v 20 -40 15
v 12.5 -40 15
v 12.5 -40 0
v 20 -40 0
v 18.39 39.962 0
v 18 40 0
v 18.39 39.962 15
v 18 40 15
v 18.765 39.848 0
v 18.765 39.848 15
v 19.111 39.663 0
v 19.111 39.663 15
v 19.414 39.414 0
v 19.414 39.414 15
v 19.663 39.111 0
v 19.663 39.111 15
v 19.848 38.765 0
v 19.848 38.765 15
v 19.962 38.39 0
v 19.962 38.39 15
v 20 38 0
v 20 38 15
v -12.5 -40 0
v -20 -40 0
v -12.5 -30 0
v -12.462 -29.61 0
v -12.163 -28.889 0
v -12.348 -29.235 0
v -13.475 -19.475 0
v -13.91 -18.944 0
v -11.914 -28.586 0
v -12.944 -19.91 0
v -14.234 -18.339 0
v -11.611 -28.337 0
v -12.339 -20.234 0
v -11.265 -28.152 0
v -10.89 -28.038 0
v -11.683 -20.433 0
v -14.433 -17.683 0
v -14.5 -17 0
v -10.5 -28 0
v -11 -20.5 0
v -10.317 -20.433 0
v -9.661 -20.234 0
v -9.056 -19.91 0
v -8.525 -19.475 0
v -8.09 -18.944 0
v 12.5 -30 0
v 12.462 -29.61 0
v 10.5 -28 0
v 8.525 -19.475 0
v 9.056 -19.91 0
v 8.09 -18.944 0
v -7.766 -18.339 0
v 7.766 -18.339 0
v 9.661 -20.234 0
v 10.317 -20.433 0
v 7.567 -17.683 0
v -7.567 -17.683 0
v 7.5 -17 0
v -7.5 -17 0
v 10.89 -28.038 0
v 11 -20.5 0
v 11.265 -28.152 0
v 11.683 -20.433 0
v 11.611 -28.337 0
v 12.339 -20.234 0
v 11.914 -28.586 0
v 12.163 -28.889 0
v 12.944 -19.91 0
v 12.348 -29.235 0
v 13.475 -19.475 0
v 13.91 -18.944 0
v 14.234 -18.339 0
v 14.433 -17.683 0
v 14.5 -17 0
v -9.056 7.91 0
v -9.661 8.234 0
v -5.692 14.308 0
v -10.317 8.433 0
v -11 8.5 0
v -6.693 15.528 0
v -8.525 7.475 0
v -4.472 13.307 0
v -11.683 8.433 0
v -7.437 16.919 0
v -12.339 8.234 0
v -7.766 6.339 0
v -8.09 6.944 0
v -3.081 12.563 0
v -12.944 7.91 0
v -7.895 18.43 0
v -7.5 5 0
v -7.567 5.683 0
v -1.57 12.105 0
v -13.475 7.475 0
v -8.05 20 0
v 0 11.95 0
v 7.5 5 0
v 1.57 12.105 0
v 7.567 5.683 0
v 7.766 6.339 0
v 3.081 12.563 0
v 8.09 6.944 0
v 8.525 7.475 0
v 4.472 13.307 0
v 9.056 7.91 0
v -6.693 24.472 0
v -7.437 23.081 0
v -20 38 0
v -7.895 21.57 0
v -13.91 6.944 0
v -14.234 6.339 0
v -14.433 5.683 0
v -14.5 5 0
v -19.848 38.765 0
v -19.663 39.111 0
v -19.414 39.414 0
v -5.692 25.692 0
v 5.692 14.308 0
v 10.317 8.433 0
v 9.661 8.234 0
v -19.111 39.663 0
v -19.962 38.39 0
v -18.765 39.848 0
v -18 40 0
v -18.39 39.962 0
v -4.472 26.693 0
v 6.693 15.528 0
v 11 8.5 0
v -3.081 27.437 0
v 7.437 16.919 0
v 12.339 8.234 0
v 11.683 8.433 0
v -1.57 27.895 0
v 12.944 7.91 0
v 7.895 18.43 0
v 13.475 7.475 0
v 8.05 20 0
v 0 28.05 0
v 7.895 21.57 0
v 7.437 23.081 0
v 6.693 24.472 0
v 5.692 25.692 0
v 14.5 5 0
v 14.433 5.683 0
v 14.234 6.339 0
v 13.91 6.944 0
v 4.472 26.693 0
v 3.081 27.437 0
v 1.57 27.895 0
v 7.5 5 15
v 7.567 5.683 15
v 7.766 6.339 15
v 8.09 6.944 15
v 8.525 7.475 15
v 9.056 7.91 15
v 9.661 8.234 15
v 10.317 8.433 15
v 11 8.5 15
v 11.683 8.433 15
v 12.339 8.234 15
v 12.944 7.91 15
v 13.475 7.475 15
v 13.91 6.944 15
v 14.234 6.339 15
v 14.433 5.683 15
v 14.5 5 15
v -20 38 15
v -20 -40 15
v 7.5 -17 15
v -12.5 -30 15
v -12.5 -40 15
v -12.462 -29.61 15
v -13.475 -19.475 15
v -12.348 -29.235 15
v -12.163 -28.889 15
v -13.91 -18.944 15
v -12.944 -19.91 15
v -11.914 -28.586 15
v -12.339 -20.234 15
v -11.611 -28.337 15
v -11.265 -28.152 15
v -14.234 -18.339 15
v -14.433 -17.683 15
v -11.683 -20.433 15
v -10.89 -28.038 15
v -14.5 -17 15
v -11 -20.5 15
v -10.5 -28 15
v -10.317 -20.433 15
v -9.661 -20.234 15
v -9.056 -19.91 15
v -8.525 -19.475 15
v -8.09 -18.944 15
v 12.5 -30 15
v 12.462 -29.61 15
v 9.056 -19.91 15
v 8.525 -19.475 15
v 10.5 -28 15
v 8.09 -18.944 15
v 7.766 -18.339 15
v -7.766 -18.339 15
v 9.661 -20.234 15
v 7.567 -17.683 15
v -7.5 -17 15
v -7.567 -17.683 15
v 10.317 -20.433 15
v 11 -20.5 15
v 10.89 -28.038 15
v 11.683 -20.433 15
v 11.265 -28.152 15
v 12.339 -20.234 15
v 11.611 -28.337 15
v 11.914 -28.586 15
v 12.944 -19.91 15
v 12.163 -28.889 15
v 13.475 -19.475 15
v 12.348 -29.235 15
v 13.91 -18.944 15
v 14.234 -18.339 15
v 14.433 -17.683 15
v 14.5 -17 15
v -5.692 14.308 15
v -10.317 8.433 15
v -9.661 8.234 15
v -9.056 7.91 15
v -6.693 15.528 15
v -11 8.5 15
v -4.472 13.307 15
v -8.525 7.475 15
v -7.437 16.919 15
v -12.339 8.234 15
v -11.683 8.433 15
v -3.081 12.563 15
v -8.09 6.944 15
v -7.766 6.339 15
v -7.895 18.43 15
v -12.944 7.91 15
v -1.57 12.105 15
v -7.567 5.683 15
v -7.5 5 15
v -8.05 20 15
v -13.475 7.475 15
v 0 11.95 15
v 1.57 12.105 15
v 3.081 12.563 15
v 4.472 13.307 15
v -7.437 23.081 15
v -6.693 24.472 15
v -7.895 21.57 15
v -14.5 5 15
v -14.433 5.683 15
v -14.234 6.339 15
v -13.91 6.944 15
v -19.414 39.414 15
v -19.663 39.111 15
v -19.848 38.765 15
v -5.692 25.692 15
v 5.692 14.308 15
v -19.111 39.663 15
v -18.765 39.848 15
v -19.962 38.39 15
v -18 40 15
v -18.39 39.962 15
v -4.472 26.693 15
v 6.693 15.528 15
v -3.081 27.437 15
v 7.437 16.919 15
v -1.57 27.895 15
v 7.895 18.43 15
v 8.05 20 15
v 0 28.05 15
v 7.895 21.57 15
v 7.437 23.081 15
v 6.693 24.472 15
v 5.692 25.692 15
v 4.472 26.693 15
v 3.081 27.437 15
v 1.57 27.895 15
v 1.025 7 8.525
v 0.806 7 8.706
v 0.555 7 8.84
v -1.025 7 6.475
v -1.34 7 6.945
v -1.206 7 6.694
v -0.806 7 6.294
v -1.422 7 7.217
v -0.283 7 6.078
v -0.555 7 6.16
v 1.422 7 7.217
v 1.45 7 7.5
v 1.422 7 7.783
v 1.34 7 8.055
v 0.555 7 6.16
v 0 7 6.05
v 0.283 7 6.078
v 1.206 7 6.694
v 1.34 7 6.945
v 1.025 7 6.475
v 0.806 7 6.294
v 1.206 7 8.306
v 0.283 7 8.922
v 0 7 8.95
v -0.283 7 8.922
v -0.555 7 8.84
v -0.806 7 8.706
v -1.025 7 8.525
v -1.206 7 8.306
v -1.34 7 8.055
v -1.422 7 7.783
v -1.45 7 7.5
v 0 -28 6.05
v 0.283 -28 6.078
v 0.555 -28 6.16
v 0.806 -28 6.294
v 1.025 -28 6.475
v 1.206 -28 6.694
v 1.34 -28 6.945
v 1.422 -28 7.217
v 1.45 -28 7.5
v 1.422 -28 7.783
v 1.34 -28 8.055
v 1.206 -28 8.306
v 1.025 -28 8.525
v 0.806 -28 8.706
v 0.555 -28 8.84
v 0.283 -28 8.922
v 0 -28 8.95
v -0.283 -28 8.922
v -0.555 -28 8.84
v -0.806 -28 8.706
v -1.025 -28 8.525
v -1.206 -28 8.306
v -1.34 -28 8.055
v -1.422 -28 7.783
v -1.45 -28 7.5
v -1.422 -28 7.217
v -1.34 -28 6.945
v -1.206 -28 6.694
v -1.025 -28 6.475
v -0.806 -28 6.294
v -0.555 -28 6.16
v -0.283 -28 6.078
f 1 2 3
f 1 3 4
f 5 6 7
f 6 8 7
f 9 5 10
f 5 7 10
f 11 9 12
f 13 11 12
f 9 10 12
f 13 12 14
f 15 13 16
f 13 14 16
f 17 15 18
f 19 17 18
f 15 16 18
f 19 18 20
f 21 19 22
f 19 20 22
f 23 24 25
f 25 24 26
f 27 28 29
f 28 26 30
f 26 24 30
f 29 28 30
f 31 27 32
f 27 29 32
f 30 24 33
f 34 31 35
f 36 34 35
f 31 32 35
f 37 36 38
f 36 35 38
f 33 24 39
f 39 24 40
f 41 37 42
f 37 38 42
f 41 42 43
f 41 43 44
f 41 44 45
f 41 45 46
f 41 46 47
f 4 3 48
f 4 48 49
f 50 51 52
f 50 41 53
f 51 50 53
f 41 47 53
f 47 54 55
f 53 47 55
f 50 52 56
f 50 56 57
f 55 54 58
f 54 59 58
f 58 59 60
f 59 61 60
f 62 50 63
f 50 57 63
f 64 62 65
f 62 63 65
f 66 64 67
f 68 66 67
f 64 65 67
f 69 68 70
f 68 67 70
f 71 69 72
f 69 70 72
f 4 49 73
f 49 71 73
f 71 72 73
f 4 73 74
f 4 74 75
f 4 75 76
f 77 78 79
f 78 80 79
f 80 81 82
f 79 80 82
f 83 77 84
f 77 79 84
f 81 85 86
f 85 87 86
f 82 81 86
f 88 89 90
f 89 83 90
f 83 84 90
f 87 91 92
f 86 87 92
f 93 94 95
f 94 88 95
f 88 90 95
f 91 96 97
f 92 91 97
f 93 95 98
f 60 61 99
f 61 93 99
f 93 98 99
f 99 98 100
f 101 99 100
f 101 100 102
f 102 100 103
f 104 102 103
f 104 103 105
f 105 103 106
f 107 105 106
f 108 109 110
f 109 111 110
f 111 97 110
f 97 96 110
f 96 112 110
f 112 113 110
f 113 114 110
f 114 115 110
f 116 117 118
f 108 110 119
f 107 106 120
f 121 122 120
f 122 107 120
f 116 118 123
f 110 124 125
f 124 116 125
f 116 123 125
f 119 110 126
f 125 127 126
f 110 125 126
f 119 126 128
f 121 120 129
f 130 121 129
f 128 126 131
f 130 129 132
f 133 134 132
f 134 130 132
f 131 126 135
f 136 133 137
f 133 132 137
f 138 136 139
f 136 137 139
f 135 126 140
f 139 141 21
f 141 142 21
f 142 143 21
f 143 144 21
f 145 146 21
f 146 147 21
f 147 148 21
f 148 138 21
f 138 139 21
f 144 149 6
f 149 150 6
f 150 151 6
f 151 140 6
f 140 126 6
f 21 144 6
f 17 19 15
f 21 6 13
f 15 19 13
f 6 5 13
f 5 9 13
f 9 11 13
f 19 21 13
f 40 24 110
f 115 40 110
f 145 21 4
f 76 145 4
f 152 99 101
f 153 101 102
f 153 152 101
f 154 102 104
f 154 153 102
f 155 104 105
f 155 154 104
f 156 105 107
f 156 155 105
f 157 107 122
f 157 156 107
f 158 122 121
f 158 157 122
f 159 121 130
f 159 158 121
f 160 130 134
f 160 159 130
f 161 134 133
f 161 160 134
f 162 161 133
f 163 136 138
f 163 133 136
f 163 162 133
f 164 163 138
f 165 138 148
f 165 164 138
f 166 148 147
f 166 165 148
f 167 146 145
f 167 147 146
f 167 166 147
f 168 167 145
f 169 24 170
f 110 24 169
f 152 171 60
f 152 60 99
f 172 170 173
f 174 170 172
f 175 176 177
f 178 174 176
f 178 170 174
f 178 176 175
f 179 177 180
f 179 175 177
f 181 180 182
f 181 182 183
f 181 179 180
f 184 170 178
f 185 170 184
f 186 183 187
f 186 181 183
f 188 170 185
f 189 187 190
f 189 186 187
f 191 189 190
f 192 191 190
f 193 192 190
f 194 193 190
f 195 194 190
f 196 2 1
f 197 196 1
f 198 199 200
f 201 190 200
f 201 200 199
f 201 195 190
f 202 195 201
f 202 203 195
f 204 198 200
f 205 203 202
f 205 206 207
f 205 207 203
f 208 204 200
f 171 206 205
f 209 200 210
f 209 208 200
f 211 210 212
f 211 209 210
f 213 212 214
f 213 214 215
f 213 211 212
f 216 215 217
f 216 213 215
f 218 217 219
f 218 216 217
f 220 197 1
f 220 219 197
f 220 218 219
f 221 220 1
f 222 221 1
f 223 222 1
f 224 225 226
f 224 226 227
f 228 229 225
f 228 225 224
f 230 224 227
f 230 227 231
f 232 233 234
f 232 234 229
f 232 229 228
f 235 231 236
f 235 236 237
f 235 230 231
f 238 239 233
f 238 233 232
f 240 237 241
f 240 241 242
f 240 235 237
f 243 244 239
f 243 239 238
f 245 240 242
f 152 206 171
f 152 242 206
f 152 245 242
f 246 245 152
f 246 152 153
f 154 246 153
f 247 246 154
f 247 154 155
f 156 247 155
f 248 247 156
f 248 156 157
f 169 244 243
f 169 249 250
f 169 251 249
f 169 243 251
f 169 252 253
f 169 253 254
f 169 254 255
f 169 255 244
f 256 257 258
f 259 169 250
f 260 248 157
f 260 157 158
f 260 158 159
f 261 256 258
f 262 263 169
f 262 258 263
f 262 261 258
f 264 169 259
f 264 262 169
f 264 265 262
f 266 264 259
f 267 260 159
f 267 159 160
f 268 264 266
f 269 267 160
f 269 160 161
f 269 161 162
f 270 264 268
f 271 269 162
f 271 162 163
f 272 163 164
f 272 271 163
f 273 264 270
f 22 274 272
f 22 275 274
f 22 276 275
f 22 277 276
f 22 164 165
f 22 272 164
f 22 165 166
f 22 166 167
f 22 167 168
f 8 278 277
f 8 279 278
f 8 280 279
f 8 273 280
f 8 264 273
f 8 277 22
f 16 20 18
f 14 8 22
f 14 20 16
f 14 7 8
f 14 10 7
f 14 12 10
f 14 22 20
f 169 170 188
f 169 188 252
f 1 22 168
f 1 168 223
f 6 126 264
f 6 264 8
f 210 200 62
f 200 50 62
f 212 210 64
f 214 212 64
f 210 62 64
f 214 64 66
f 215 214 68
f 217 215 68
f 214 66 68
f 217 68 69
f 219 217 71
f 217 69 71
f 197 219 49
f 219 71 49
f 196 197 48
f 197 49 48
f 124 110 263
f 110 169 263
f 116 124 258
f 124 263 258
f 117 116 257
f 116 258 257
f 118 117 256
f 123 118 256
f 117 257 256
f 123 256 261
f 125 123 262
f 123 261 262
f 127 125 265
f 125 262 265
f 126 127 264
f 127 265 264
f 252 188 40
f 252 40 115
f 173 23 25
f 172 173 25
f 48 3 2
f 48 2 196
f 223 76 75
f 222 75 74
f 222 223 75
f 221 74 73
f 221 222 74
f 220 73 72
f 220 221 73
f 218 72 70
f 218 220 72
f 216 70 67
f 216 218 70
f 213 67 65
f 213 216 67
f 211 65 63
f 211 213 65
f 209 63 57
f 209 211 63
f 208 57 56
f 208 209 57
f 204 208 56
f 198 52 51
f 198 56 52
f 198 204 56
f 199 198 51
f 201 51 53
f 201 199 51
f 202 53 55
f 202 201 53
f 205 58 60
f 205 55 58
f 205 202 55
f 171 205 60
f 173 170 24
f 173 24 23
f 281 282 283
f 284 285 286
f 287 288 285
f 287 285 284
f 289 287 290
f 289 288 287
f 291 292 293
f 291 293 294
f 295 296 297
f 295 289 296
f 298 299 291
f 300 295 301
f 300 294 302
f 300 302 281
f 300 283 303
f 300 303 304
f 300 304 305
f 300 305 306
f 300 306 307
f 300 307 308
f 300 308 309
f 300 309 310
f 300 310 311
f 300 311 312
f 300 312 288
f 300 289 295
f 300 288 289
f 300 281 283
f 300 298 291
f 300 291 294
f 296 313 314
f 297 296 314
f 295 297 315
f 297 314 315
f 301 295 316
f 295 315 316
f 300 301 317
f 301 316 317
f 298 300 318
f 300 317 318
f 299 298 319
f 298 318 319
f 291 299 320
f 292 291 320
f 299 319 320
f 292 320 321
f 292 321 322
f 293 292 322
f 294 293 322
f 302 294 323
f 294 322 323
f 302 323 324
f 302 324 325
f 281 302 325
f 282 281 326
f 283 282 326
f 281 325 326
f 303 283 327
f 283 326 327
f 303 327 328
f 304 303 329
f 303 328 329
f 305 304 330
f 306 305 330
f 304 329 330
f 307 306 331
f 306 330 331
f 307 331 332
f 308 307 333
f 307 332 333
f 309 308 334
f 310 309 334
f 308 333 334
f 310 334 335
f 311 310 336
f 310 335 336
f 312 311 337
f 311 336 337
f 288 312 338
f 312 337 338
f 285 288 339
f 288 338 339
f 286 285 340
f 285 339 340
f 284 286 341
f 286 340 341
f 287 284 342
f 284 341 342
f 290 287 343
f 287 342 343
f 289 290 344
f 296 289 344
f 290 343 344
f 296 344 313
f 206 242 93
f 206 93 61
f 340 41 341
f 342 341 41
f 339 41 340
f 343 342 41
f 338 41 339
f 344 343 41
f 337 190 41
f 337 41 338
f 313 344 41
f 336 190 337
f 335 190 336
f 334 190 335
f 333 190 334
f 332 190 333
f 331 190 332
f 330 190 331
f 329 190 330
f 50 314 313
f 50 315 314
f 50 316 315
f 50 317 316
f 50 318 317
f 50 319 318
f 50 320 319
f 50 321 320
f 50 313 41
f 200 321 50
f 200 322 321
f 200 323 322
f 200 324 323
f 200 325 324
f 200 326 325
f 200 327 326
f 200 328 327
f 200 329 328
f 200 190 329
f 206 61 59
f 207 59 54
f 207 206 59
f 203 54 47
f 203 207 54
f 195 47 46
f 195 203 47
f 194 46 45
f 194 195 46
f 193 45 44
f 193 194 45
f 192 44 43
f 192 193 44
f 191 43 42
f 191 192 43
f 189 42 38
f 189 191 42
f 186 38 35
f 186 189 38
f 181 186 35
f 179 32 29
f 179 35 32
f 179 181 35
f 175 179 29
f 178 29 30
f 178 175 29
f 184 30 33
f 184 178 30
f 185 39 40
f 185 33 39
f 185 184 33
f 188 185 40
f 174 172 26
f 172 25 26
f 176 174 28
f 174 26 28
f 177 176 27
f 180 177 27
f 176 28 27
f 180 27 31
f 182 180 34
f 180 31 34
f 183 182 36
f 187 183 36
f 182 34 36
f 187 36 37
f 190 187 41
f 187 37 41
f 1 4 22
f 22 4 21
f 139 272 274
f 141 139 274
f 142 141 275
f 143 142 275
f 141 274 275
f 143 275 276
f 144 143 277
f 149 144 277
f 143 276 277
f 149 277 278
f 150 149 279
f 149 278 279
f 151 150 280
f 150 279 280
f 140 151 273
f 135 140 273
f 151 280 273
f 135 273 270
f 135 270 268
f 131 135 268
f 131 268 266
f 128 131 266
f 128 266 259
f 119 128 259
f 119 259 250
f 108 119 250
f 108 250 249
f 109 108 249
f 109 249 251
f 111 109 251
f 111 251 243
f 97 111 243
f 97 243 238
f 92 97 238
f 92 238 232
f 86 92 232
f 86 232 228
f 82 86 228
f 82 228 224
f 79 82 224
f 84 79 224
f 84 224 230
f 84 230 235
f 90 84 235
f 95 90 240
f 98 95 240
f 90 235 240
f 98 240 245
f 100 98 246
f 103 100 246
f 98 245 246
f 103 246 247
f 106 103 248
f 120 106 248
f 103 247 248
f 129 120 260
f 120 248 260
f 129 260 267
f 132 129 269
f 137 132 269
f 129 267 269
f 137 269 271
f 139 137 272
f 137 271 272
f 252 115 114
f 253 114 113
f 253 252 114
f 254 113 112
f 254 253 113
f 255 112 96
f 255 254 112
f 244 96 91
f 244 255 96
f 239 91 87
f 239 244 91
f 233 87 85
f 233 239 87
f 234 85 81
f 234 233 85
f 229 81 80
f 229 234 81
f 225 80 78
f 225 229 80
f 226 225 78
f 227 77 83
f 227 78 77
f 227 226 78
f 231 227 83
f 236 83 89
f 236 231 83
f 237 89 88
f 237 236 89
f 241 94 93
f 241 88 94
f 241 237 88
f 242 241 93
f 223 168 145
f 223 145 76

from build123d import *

# Parameters (mm, degrees)
SKETCH_1_W          = 40
SKETCH_1_H          = 80
EXTRUDE_1_DEPTH     = 15
SKETCH_2_R          = 8.05
CUT_EXTRUDE_1_DEPTH = 60
SKETCH_3_W          = 25
SKETCH_3_H          = 16.969379431
CUT_EXTRUDE_2_DEPTH = 60
SKETCH_4_R          = 1.45
CUT_EXTRUDE_3_DEPTH = 35
CUT_EXTRUDE_4_DEPTH = 35
FILLET_1_R          = 2


with BuildPart() as part:
    # 草图1 → 凸台-拉伸1 (new body)
    with BuildSketch(Plane.XY):
        Rectangle(SKETCH_1_W, SKETCH_1_H)
    extrude(amount=EXTRUDE_1_DEPTH)

    # 草图2 → 切除-拉伸1 (cut)
    with BuildSketch(Plane.XY.offset(15)):
        with Locations((0, 20)):
            Circle(SKETCH_2_R)
    extrude(amount=-CUT_EXTRUDE_1_DEPTH, mode=Mode.SUBTRACT)

    # 草图3 → 切除-拉伸2 (cut)
    with BuildSketch(Plane.XY.offset(15)):
        with Locations((0, -36.484689715)):
            Rectangle(SKETCH_3_W, SKETCH_3_H)
    extrude(amount=-CUT_EXTRUDE_2_DEPTH, mode=Mode.SUBTRACT)

    # 草图4 → 切除-拉伸3 (cut)
    with BuildSketch(Plane.XZ.offset(28)):
        with Locations(Location((0, 7.5, 0), (0, 0, 270))):
            Circle(SKETCH_4_R)
    extrude(amount=-CUT_EXTRUDE_3_DEPTH, mode=Mode.SUBTRACT)

    # 草图5 → 切除-拉伸4 (cut)
    with BuildSketch(Plane.XY.offset(15)):
        with BuildLine():
            Line((-7.5, 5), (-7.5, -17))
            ThreePointArc((-7.5, -17), (-11, -20.5), (-14.5, -17))
            Line((-14.5, -17), (-14.5, 5))
            ThreePointArc((-14.5, 5), (-11, 8.5), (-7.5, 5))
        make_face()
        with BuildLine():
            Line((14.5, 5), (14.5, -17))
            ThreePointArc((14.5, -17), (11, -20.5), (7.5, -17))
            Line((7.5, -17), (7.5, 5))
            ThreePointArc((7.5, 5), (11, 8.5), (14.5, 5))
        make_face()
    extrude(amount=-CUT_EXTRUDE_4_DEPTH, mode=Mode.SUBTRACT)

    # 圆角1
    fillet_1_edges = [part.edges().sort_by_distance(p)[0] for p in [
        (12.5, -28, 7.5),
        (-12.5, -28, 7.5),
        (-20, 40, 7.5),
        (20, 40, 7.5),
    ]]
    fillet(fillet_1_edges, radius=FILLET_1_R)


solid = part.part
